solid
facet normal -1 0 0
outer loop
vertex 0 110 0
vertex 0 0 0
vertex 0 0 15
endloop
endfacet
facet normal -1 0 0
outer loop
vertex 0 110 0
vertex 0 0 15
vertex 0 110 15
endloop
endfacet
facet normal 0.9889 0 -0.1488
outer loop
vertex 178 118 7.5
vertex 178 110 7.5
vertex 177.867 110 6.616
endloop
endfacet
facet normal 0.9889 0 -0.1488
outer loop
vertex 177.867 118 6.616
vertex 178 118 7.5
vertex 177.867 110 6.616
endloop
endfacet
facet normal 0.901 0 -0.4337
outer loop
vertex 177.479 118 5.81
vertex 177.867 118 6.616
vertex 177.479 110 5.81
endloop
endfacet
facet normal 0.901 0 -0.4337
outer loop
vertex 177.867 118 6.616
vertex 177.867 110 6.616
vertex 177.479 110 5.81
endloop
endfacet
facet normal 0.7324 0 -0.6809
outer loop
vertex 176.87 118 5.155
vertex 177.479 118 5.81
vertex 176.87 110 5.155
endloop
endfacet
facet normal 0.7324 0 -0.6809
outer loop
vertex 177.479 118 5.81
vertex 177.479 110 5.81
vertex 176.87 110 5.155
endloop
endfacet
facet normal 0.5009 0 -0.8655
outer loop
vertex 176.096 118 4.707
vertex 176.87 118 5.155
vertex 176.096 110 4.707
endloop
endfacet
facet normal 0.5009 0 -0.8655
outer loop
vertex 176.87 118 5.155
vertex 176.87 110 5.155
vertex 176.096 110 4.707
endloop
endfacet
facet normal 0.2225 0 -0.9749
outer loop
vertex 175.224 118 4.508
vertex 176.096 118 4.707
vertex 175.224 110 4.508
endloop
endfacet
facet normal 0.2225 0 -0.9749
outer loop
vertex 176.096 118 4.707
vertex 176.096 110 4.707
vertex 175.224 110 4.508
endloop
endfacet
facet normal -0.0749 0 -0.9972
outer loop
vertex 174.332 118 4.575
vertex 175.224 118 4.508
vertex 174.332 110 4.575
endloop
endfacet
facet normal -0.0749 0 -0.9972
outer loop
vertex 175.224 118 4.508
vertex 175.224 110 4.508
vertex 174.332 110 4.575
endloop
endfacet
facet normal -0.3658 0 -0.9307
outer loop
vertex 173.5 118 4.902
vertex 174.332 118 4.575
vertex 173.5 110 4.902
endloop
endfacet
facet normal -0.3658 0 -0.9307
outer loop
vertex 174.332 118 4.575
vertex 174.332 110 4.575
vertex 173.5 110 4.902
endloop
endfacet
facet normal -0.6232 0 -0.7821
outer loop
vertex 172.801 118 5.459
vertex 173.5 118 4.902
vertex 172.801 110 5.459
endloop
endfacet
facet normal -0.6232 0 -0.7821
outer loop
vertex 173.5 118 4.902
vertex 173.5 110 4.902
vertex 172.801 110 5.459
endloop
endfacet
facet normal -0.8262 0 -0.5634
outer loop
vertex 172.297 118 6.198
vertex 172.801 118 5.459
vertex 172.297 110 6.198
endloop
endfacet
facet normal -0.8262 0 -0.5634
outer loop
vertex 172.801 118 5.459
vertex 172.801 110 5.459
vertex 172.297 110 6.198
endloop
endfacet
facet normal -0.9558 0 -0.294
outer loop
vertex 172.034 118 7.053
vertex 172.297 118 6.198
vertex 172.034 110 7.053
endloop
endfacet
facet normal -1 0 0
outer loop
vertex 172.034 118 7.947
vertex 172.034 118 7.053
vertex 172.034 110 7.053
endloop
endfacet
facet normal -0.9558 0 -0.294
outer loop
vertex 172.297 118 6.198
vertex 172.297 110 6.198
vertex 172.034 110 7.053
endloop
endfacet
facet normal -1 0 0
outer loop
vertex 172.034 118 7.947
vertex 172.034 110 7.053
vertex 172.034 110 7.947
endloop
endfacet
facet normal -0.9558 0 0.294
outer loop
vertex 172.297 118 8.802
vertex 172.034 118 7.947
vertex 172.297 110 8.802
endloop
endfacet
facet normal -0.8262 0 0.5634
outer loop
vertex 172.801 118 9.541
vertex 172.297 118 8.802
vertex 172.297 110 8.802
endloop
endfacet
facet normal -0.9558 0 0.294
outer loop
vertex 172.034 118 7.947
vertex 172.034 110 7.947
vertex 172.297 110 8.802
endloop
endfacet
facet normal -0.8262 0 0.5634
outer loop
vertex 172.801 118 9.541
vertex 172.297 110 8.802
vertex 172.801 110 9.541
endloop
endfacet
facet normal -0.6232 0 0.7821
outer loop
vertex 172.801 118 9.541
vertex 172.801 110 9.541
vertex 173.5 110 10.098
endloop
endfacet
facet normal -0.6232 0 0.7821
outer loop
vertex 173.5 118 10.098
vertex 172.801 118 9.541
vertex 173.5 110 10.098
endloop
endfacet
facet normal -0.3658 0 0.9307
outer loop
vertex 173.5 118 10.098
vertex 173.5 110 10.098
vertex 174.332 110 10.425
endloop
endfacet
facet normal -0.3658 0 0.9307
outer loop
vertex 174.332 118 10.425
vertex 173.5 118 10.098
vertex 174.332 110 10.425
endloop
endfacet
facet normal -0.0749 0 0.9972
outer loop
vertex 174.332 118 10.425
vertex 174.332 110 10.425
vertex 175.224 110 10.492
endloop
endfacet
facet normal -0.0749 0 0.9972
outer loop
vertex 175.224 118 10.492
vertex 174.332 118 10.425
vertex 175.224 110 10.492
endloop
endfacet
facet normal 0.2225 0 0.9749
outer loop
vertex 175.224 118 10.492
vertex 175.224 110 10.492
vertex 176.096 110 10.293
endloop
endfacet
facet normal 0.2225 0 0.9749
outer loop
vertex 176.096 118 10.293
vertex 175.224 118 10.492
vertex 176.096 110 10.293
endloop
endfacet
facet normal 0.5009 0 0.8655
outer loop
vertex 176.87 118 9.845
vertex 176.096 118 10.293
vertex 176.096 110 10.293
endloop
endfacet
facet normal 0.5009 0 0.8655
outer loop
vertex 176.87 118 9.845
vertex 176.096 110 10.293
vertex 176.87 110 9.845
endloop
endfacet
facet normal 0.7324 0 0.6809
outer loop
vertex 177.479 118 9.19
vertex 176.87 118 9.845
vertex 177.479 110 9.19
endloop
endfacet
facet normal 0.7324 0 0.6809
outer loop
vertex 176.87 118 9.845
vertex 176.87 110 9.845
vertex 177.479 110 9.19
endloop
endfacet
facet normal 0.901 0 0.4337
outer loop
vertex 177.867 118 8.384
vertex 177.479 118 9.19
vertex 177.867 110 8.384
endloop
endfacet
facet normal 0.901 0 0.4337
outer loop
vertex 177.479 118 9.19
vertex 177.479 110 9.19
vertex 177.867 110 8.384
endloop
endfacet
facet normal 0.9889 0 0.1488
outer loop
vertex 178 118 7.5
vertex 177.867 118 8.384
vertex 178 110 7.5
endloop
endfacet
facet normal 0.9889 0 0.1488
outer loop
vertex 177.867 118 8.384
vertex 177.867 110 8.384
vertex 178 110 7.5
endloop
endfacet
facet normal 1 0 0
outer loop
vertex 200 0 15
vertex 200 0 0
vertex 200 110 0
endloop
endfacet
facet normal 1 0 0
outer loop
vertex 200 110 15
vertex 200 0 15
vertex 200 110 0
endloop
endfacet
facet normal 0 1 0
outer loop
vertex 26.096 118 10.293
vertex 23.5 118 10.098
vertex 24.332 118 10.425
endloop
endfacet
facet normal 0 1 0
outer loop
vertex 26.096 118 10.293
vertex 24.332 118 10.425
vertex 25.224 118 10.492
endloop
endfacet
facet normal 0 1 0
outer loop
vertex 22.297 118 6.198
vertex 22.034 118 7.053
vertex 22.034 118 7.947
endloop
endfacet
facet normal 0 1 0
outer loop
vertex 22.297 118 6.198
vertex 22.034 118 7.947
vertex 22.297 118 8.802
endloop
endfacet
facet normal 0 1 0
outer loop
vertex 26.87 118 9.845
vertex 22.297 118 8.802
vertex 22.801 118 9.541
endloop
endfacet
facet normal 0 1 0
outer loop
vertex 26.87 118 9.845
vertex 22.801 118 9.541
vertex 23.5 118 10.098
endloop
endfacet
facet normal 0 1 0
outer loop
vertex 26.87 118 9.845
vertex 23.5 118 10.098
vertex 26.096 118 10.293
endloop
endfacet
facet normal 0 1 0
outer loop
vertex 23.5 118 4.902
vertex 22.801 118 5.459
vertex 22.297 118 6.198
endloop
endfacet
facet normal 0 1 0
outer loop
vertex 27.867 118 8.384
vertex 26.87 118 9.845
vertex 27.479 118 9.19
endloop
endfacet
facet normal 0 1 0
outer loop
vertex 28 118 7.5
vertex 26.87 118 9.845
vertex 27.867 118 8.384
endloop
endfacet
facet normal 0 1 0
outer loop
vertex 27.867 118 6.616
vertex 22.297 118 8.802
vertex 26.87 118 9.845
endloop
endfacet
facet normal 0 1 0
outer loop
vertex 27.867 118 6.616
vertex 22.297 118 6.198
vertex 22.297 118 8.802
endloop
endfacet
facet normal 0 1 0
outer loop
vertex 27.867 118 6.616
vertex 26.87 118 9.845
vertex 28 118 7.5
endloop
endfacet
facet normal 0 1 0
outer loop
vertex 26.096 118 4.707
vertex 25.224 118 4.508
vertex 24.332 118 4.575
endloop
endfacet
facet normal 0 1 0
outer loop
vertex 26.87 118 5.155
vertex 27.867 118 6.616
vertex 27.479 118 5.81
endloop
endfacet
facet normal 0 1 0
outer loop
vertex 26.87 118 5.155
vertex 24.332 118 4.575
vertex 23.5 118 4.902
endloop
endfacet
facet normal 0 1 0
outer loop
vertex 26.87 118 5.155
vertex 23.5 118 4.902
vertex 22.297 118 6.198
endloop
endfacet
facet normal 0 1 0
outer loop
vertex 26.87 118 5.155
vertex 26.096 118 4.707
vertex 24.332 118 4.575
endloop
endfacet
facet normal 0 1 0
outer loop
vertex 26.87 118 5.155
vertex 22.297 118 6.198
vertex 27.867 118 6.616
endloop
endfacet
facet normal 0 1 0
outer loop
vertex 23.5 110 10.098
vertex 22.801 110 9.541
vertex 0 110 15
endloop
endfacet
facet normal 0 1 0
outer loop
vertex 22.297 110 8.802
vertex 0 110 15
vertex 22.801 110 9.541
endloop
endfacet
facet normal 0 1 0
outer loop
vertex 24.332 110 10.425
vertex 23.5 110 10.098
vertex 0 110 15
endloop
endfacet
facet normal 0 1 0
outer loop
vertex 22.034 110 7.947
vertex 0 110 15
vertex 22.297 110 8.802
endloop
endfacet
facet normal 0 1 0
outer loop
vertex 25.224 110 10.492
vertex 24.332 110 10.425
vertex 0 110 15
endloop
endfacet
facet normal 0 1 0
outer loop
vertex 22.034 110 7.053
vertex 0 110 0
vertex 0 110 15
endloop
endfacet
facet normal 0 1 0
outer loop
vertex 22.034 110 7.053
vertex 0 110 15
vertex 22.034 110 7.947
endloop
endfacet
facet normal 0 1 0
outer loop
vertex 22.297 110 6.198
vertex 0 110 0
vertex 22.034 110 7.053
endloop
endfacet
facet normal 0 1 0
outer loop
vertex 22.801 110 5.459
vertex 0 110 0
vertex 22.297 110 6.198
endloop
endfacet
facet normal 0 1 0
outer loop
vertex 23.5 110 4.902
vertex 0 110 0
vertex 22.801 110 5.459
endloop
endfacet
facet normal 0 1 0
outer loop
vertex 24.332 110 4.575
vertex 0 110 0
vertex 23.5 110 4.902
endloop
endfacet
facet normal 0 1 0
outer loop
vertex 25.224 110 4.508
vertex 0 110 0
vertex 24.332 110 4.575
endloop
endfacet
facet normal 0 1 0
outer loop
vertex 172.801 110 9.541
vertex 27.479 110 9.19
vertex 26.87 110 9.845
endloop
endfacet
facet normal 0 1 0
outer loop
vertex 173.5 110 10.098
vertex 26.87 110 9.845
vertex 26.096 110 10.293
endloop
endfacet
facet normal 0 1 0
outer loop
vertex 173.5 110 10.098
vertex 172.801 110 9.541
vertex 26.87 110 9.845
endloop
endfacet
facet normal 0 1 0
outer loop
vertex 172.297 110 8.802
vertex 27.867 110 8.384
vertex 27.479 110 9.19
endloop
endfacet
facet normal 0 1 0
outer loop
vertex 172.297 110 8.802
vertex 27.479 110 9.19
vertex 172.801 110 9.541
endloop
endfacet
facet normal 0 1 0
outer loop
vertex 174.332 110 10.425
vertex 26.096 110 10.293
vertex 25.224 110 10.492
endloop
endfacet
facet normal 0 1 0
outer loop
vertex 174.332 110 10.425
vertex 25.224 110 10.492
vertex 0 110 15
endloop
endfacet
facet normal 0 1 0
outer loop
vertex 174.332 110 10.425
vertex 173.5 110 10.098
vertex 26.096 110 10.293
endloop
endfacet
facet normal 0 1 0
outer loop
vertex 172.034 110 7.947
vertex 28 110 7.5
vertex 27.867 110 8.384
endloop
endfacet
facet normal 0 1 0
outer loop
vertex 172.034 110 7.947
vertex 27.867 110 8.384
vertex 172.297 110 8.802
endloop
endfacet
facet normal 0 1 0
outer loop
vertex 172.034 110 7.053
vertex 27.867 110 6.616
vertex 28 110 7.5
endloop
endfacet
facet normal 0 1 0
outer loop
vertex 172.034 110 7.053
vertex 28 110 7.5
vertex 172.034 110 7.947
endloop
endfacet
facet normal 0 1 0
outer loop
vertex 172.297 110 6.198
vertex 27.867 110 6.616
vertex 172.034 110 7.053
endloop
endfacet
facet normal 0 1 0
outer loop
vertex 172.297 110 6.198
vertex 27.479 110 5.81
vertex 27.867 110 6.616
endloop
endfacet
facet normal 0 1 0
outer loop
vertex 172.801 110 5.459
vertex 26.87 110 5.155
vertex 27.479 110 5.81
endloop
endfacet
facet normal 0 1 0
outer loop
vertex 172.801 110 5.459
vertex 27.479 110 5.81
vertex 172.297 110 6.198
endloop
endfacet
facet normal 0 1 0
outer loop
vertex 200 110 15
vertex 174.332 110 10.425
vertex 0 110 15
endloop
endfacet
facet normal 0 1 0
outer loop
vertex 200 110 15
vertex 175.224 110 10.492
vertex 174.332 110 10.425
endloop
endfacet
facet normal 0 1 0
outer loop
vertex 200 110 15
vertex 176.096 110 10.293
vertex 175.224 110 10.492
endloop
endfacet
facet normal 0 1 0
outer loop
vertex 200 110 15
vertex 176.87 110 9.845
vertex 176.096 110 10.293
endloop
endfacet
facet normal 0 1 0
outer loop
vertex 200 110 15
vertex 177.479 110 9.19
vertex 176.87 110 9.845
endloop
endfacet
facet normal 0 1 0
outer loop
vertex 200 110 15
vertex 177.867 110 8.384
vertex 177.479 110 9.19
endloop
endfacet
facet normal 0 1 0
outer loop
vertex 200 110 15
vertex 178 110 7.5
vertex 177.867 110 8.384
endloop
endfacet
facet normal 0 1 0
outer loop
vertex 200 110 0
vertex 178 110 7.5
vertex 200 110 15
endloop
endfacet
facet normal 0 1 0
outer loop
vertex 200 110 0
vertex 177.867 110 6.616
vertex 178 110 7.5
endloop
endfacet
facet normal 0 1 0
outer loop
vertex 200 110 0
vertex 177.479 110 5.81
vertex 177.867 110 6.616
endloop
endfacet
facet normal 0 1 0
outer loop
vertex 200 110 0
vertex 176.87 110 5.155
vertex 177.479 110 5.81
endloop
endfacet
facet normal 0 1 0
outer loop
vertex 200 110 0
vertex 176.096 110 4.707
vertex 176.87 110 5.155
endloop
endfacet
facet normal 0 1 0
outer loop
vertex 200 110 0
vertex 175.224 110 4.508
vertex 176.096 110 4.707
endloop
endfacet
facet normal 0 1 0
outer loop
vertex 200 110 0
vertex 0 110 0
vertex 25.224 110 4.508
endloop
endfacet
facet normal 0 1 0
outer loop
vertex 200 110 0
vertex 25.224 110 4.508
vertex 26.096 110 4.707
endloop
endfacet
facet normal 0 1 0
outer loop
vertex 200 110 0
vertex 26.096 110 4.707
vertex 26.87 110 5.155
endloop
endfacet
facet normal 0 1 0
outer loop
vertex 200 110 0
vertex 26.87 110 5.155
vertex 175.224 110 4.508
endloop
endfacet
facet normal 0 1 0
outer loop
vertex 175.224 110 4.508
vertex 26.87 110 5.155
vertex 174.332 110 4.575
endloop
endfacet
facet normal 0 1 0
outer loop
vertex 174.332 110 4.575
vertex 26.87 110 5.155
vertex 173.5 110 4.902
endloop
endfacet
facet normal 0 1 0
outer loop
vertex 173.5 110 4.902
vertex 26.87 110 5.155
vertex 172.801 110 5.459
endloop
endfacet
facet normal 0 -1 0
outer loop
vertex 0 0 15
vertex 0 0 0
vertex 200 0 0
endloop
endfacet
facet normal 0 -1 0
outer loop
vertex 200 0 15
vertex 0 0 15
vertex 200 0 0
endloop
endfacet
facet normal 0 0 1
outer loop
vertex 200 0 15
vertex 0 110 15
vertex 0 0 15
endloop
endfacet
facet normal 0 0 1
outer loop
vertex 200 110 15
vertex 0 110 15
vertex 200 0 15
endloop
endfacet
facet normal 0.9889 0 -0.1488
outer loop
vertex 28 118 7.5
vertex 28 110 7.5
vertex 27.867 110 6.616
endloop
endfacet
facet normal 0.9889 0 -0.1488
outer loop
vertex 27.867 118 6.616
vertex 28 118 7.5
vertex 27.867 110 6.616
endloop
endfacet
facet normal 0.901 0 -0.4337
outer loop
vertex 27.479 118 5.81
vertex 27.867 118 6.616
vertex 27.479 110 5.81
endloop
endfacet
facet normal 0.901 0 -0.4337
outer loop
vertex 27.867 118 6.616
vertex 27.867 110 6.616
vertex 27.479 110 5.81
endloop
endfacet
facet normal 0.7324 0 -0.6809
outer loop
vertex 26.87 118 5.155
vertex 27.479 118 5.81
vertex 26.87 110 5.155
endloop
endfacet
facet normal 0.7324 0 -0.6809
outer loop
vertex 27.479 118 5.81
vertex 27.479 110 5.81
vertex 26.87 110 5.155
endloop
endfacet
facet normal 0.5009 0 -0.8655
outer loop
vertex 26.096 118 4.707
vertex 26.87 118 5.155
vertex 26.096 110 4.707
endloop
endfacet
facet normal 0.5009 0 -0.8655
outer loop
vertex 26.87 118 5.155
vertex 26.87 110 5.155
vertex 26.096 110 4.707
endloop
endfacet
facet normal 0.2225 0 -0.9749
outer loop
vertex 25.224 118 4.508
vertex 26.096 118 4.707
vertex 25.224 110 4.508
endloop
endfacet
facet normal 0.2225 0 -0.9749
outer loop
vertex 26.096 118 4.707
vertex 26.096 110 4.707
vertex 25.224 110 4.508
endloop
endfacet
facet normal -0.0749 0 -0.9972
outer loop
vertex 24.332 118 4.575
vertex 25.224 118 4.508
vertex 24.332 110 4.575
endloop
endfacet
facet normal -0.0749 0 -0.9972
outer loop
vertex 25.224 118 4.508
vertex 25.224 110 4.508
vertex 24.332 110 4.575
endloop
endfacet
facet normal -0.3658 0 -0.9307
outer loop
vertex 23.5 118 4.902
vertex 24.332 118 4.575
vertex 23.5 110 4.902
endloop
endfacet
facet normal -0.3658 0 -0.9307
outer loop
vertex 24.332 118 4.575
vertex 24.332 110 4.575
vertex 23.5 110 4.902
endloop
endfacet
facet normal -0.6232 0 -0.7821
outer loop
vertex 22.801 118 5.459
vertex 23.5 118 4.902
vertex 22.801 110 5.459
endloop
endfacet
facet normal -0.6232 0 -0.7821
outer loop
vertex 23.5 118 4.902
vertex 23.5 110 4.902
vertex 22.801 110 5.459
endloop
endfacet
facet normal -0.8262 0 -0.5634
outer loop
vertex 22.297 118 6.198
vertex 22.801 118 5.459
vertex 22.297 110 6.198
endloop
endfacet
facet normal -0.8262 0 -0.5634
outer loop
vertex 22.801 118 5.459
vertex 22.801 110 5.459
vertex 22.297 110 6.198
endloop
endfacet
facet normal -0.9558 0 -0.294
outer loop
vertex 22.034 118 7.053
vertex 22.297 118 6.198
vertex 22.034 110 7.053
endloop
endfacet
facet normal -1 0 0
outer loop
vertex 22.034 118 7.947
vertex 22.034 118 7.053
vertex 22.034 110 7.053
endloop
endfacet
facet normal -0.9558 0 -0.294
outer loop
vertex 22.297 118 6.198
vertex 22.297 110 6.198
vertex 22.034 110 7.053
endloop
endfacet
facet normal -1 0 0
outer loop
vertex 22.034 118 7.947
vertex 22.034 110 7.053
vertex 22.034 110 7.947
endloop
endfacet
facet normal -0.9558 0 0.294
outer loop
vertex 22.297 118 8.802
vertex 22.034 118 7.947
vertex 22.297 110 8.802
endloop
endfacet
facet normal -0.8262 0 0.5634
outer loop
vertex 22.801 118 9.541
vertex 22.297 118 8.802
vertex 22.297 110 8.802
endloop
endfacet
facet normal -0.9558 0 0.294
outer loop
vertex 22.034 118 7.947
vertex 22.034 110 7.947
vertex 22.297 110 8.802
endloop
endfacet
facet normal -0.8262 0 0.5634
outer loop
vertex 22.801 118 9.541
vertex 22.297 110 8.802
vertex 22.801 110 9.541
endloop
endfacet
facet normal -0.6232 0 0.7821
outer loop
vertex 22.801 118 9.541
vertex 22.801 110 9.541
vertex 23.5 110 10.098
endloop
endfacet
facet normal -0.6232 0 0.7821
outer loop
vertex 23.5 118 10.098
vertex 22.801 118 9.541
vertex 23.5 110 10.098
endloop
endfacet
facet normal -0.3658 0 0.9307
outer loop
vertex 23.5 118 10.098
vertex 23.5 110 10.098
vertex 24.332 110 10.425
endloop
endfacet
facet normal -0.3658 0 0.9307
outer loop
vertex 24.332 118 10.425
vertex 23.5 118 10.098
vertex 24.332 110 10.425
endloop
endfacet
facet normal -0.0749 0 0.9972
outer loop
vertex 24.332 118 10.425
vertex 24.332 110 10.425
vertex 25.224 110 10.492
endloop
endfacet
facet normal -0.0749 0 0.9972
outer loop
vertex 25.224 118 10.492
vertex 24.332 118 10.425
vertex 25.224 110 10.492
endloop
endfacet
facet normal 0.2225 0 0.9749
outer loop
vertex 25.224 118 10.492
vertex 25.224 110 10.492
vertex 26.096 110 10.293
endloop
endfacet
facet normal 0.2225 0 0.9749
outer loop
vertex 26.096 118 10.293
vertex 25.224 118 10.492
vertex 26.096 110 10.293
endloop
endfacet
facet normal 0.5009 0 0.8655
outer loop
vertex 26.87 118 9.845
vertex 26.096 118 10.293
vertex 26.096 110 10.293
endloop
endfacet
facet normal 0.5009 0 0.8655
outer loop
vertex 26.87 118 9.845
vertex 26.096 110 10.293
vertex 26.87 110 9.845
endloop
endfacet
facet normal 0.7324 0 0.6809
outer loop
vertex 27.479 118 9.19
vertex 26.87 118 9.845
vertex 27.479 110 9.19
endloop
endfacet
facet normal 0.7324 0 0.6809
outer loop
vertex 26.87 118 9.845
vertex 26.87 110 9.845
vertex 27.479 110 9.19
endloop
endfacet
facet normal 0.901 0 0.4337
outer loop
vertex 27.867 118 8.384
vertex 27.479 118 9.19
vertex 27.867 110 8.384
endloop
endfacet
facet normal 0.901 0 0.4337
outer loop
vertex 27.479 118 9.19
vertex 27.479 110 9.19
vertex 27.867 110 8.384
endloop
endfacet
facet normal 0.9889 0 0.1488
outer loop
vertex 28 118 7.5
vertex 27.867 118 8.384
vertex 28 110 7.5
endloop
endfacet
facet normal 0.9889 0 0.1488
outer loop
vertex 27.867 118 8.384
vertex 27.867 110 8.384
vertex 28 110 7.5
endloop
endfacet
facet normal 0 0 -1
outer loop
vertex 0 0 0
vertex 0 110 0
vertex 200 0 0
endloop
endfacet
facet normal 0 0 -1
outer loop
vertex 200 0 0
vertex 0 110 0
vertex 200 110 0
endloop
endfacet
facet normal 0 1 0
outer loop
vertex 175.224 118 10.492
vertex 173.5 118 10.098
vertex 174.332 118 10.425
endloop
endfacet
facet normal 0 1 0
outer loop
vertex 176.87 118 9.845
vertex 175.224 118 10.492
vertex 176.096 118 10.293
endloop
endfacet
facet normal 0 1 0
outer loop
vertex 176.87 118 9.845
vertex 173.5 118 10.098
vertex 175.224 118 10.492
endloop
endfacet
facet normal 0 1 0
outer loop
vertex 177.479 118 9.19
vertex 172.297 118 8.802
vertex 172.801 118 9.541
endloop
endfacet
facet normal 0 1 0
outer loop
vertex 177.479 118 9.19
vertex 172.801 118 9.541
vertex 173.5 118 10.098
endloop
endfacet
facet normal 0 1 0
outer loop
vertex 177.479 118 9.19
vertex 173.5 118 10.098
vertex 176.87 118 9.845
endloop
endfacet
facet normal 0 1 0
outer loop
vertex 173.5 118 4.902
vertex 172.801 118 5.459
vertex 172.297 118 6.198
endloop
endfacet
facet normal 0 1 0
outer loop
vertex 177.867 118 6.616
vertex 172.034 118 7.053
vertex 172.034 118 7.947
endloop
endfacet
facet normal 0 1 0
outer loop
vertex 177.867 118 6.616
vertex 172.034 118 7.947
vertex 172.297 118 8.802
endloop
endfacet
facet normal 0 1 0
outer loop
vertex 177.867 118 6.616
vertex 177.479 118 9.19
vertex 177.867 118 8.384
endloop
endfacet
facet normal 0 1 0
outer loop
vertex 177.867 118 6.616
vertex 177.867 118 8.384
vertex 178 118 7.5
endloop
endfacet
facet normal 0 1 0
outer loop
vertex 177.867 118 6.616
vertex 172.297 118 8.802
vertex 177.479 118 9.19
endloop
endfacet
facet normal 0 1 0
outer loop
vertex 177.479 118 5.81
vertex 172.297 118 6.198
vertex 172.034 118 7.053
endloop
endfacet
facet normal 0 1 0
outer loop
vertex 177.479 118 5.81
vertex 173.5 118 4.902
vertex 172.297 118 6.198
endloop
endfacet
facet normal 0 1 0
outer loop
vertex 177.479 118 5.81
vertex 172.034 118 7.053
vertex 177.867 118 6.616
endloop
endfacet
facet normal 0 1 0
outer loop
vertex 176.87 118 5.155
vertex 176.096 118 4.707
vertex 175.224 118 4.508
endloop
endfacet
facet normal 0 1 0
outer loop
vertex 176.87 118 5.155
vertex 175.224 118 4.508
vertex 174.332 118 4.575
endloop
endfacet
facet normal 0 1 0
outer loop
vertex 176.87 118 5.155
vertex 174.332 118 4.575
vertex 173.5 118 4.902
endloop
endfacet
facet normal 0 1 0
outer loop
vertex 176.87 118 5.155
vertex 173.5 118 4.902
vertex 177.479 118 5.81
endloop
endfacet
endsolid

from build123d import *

# Parameters (mm, degrees)
ESBO_O1_W                = 200
ESBO_O1_H                = 110
RESSALTO_EXTRUS_O1_DEPTH = 15
ESBO_O7_R                = 3
RESSALTO_EXTRUS_O2_DEPTH = 8


with BuildPart() as part:
    # Esboço1 → Ressalto-extrusão1 (new body)
    with BuildSketch(Plane.XY):
        with Locations((100, 55)):
            Rectangle(ESBO_O1_W, ESBO_O1_H)
    extrude(amount=RESSALTO_EXTRUS_O1_DEPTH)

    # Esboço7 → Ressalto-extrusão2 (add)
    with BuildSketch(Plane(origin=(0, 110, 0), x_dir=(1, 0, 0), z_dir=(0, 1, 0))):
        with Locations((175, -7.5)):
            Circle(ESBO_O7_R)
        with Locations((25, -7.5)):
            Circle(ESBO_O7_R)
    extrude(amount=RESSALTO_EXTRUS_O2_DEPTH)


solid = part.part
